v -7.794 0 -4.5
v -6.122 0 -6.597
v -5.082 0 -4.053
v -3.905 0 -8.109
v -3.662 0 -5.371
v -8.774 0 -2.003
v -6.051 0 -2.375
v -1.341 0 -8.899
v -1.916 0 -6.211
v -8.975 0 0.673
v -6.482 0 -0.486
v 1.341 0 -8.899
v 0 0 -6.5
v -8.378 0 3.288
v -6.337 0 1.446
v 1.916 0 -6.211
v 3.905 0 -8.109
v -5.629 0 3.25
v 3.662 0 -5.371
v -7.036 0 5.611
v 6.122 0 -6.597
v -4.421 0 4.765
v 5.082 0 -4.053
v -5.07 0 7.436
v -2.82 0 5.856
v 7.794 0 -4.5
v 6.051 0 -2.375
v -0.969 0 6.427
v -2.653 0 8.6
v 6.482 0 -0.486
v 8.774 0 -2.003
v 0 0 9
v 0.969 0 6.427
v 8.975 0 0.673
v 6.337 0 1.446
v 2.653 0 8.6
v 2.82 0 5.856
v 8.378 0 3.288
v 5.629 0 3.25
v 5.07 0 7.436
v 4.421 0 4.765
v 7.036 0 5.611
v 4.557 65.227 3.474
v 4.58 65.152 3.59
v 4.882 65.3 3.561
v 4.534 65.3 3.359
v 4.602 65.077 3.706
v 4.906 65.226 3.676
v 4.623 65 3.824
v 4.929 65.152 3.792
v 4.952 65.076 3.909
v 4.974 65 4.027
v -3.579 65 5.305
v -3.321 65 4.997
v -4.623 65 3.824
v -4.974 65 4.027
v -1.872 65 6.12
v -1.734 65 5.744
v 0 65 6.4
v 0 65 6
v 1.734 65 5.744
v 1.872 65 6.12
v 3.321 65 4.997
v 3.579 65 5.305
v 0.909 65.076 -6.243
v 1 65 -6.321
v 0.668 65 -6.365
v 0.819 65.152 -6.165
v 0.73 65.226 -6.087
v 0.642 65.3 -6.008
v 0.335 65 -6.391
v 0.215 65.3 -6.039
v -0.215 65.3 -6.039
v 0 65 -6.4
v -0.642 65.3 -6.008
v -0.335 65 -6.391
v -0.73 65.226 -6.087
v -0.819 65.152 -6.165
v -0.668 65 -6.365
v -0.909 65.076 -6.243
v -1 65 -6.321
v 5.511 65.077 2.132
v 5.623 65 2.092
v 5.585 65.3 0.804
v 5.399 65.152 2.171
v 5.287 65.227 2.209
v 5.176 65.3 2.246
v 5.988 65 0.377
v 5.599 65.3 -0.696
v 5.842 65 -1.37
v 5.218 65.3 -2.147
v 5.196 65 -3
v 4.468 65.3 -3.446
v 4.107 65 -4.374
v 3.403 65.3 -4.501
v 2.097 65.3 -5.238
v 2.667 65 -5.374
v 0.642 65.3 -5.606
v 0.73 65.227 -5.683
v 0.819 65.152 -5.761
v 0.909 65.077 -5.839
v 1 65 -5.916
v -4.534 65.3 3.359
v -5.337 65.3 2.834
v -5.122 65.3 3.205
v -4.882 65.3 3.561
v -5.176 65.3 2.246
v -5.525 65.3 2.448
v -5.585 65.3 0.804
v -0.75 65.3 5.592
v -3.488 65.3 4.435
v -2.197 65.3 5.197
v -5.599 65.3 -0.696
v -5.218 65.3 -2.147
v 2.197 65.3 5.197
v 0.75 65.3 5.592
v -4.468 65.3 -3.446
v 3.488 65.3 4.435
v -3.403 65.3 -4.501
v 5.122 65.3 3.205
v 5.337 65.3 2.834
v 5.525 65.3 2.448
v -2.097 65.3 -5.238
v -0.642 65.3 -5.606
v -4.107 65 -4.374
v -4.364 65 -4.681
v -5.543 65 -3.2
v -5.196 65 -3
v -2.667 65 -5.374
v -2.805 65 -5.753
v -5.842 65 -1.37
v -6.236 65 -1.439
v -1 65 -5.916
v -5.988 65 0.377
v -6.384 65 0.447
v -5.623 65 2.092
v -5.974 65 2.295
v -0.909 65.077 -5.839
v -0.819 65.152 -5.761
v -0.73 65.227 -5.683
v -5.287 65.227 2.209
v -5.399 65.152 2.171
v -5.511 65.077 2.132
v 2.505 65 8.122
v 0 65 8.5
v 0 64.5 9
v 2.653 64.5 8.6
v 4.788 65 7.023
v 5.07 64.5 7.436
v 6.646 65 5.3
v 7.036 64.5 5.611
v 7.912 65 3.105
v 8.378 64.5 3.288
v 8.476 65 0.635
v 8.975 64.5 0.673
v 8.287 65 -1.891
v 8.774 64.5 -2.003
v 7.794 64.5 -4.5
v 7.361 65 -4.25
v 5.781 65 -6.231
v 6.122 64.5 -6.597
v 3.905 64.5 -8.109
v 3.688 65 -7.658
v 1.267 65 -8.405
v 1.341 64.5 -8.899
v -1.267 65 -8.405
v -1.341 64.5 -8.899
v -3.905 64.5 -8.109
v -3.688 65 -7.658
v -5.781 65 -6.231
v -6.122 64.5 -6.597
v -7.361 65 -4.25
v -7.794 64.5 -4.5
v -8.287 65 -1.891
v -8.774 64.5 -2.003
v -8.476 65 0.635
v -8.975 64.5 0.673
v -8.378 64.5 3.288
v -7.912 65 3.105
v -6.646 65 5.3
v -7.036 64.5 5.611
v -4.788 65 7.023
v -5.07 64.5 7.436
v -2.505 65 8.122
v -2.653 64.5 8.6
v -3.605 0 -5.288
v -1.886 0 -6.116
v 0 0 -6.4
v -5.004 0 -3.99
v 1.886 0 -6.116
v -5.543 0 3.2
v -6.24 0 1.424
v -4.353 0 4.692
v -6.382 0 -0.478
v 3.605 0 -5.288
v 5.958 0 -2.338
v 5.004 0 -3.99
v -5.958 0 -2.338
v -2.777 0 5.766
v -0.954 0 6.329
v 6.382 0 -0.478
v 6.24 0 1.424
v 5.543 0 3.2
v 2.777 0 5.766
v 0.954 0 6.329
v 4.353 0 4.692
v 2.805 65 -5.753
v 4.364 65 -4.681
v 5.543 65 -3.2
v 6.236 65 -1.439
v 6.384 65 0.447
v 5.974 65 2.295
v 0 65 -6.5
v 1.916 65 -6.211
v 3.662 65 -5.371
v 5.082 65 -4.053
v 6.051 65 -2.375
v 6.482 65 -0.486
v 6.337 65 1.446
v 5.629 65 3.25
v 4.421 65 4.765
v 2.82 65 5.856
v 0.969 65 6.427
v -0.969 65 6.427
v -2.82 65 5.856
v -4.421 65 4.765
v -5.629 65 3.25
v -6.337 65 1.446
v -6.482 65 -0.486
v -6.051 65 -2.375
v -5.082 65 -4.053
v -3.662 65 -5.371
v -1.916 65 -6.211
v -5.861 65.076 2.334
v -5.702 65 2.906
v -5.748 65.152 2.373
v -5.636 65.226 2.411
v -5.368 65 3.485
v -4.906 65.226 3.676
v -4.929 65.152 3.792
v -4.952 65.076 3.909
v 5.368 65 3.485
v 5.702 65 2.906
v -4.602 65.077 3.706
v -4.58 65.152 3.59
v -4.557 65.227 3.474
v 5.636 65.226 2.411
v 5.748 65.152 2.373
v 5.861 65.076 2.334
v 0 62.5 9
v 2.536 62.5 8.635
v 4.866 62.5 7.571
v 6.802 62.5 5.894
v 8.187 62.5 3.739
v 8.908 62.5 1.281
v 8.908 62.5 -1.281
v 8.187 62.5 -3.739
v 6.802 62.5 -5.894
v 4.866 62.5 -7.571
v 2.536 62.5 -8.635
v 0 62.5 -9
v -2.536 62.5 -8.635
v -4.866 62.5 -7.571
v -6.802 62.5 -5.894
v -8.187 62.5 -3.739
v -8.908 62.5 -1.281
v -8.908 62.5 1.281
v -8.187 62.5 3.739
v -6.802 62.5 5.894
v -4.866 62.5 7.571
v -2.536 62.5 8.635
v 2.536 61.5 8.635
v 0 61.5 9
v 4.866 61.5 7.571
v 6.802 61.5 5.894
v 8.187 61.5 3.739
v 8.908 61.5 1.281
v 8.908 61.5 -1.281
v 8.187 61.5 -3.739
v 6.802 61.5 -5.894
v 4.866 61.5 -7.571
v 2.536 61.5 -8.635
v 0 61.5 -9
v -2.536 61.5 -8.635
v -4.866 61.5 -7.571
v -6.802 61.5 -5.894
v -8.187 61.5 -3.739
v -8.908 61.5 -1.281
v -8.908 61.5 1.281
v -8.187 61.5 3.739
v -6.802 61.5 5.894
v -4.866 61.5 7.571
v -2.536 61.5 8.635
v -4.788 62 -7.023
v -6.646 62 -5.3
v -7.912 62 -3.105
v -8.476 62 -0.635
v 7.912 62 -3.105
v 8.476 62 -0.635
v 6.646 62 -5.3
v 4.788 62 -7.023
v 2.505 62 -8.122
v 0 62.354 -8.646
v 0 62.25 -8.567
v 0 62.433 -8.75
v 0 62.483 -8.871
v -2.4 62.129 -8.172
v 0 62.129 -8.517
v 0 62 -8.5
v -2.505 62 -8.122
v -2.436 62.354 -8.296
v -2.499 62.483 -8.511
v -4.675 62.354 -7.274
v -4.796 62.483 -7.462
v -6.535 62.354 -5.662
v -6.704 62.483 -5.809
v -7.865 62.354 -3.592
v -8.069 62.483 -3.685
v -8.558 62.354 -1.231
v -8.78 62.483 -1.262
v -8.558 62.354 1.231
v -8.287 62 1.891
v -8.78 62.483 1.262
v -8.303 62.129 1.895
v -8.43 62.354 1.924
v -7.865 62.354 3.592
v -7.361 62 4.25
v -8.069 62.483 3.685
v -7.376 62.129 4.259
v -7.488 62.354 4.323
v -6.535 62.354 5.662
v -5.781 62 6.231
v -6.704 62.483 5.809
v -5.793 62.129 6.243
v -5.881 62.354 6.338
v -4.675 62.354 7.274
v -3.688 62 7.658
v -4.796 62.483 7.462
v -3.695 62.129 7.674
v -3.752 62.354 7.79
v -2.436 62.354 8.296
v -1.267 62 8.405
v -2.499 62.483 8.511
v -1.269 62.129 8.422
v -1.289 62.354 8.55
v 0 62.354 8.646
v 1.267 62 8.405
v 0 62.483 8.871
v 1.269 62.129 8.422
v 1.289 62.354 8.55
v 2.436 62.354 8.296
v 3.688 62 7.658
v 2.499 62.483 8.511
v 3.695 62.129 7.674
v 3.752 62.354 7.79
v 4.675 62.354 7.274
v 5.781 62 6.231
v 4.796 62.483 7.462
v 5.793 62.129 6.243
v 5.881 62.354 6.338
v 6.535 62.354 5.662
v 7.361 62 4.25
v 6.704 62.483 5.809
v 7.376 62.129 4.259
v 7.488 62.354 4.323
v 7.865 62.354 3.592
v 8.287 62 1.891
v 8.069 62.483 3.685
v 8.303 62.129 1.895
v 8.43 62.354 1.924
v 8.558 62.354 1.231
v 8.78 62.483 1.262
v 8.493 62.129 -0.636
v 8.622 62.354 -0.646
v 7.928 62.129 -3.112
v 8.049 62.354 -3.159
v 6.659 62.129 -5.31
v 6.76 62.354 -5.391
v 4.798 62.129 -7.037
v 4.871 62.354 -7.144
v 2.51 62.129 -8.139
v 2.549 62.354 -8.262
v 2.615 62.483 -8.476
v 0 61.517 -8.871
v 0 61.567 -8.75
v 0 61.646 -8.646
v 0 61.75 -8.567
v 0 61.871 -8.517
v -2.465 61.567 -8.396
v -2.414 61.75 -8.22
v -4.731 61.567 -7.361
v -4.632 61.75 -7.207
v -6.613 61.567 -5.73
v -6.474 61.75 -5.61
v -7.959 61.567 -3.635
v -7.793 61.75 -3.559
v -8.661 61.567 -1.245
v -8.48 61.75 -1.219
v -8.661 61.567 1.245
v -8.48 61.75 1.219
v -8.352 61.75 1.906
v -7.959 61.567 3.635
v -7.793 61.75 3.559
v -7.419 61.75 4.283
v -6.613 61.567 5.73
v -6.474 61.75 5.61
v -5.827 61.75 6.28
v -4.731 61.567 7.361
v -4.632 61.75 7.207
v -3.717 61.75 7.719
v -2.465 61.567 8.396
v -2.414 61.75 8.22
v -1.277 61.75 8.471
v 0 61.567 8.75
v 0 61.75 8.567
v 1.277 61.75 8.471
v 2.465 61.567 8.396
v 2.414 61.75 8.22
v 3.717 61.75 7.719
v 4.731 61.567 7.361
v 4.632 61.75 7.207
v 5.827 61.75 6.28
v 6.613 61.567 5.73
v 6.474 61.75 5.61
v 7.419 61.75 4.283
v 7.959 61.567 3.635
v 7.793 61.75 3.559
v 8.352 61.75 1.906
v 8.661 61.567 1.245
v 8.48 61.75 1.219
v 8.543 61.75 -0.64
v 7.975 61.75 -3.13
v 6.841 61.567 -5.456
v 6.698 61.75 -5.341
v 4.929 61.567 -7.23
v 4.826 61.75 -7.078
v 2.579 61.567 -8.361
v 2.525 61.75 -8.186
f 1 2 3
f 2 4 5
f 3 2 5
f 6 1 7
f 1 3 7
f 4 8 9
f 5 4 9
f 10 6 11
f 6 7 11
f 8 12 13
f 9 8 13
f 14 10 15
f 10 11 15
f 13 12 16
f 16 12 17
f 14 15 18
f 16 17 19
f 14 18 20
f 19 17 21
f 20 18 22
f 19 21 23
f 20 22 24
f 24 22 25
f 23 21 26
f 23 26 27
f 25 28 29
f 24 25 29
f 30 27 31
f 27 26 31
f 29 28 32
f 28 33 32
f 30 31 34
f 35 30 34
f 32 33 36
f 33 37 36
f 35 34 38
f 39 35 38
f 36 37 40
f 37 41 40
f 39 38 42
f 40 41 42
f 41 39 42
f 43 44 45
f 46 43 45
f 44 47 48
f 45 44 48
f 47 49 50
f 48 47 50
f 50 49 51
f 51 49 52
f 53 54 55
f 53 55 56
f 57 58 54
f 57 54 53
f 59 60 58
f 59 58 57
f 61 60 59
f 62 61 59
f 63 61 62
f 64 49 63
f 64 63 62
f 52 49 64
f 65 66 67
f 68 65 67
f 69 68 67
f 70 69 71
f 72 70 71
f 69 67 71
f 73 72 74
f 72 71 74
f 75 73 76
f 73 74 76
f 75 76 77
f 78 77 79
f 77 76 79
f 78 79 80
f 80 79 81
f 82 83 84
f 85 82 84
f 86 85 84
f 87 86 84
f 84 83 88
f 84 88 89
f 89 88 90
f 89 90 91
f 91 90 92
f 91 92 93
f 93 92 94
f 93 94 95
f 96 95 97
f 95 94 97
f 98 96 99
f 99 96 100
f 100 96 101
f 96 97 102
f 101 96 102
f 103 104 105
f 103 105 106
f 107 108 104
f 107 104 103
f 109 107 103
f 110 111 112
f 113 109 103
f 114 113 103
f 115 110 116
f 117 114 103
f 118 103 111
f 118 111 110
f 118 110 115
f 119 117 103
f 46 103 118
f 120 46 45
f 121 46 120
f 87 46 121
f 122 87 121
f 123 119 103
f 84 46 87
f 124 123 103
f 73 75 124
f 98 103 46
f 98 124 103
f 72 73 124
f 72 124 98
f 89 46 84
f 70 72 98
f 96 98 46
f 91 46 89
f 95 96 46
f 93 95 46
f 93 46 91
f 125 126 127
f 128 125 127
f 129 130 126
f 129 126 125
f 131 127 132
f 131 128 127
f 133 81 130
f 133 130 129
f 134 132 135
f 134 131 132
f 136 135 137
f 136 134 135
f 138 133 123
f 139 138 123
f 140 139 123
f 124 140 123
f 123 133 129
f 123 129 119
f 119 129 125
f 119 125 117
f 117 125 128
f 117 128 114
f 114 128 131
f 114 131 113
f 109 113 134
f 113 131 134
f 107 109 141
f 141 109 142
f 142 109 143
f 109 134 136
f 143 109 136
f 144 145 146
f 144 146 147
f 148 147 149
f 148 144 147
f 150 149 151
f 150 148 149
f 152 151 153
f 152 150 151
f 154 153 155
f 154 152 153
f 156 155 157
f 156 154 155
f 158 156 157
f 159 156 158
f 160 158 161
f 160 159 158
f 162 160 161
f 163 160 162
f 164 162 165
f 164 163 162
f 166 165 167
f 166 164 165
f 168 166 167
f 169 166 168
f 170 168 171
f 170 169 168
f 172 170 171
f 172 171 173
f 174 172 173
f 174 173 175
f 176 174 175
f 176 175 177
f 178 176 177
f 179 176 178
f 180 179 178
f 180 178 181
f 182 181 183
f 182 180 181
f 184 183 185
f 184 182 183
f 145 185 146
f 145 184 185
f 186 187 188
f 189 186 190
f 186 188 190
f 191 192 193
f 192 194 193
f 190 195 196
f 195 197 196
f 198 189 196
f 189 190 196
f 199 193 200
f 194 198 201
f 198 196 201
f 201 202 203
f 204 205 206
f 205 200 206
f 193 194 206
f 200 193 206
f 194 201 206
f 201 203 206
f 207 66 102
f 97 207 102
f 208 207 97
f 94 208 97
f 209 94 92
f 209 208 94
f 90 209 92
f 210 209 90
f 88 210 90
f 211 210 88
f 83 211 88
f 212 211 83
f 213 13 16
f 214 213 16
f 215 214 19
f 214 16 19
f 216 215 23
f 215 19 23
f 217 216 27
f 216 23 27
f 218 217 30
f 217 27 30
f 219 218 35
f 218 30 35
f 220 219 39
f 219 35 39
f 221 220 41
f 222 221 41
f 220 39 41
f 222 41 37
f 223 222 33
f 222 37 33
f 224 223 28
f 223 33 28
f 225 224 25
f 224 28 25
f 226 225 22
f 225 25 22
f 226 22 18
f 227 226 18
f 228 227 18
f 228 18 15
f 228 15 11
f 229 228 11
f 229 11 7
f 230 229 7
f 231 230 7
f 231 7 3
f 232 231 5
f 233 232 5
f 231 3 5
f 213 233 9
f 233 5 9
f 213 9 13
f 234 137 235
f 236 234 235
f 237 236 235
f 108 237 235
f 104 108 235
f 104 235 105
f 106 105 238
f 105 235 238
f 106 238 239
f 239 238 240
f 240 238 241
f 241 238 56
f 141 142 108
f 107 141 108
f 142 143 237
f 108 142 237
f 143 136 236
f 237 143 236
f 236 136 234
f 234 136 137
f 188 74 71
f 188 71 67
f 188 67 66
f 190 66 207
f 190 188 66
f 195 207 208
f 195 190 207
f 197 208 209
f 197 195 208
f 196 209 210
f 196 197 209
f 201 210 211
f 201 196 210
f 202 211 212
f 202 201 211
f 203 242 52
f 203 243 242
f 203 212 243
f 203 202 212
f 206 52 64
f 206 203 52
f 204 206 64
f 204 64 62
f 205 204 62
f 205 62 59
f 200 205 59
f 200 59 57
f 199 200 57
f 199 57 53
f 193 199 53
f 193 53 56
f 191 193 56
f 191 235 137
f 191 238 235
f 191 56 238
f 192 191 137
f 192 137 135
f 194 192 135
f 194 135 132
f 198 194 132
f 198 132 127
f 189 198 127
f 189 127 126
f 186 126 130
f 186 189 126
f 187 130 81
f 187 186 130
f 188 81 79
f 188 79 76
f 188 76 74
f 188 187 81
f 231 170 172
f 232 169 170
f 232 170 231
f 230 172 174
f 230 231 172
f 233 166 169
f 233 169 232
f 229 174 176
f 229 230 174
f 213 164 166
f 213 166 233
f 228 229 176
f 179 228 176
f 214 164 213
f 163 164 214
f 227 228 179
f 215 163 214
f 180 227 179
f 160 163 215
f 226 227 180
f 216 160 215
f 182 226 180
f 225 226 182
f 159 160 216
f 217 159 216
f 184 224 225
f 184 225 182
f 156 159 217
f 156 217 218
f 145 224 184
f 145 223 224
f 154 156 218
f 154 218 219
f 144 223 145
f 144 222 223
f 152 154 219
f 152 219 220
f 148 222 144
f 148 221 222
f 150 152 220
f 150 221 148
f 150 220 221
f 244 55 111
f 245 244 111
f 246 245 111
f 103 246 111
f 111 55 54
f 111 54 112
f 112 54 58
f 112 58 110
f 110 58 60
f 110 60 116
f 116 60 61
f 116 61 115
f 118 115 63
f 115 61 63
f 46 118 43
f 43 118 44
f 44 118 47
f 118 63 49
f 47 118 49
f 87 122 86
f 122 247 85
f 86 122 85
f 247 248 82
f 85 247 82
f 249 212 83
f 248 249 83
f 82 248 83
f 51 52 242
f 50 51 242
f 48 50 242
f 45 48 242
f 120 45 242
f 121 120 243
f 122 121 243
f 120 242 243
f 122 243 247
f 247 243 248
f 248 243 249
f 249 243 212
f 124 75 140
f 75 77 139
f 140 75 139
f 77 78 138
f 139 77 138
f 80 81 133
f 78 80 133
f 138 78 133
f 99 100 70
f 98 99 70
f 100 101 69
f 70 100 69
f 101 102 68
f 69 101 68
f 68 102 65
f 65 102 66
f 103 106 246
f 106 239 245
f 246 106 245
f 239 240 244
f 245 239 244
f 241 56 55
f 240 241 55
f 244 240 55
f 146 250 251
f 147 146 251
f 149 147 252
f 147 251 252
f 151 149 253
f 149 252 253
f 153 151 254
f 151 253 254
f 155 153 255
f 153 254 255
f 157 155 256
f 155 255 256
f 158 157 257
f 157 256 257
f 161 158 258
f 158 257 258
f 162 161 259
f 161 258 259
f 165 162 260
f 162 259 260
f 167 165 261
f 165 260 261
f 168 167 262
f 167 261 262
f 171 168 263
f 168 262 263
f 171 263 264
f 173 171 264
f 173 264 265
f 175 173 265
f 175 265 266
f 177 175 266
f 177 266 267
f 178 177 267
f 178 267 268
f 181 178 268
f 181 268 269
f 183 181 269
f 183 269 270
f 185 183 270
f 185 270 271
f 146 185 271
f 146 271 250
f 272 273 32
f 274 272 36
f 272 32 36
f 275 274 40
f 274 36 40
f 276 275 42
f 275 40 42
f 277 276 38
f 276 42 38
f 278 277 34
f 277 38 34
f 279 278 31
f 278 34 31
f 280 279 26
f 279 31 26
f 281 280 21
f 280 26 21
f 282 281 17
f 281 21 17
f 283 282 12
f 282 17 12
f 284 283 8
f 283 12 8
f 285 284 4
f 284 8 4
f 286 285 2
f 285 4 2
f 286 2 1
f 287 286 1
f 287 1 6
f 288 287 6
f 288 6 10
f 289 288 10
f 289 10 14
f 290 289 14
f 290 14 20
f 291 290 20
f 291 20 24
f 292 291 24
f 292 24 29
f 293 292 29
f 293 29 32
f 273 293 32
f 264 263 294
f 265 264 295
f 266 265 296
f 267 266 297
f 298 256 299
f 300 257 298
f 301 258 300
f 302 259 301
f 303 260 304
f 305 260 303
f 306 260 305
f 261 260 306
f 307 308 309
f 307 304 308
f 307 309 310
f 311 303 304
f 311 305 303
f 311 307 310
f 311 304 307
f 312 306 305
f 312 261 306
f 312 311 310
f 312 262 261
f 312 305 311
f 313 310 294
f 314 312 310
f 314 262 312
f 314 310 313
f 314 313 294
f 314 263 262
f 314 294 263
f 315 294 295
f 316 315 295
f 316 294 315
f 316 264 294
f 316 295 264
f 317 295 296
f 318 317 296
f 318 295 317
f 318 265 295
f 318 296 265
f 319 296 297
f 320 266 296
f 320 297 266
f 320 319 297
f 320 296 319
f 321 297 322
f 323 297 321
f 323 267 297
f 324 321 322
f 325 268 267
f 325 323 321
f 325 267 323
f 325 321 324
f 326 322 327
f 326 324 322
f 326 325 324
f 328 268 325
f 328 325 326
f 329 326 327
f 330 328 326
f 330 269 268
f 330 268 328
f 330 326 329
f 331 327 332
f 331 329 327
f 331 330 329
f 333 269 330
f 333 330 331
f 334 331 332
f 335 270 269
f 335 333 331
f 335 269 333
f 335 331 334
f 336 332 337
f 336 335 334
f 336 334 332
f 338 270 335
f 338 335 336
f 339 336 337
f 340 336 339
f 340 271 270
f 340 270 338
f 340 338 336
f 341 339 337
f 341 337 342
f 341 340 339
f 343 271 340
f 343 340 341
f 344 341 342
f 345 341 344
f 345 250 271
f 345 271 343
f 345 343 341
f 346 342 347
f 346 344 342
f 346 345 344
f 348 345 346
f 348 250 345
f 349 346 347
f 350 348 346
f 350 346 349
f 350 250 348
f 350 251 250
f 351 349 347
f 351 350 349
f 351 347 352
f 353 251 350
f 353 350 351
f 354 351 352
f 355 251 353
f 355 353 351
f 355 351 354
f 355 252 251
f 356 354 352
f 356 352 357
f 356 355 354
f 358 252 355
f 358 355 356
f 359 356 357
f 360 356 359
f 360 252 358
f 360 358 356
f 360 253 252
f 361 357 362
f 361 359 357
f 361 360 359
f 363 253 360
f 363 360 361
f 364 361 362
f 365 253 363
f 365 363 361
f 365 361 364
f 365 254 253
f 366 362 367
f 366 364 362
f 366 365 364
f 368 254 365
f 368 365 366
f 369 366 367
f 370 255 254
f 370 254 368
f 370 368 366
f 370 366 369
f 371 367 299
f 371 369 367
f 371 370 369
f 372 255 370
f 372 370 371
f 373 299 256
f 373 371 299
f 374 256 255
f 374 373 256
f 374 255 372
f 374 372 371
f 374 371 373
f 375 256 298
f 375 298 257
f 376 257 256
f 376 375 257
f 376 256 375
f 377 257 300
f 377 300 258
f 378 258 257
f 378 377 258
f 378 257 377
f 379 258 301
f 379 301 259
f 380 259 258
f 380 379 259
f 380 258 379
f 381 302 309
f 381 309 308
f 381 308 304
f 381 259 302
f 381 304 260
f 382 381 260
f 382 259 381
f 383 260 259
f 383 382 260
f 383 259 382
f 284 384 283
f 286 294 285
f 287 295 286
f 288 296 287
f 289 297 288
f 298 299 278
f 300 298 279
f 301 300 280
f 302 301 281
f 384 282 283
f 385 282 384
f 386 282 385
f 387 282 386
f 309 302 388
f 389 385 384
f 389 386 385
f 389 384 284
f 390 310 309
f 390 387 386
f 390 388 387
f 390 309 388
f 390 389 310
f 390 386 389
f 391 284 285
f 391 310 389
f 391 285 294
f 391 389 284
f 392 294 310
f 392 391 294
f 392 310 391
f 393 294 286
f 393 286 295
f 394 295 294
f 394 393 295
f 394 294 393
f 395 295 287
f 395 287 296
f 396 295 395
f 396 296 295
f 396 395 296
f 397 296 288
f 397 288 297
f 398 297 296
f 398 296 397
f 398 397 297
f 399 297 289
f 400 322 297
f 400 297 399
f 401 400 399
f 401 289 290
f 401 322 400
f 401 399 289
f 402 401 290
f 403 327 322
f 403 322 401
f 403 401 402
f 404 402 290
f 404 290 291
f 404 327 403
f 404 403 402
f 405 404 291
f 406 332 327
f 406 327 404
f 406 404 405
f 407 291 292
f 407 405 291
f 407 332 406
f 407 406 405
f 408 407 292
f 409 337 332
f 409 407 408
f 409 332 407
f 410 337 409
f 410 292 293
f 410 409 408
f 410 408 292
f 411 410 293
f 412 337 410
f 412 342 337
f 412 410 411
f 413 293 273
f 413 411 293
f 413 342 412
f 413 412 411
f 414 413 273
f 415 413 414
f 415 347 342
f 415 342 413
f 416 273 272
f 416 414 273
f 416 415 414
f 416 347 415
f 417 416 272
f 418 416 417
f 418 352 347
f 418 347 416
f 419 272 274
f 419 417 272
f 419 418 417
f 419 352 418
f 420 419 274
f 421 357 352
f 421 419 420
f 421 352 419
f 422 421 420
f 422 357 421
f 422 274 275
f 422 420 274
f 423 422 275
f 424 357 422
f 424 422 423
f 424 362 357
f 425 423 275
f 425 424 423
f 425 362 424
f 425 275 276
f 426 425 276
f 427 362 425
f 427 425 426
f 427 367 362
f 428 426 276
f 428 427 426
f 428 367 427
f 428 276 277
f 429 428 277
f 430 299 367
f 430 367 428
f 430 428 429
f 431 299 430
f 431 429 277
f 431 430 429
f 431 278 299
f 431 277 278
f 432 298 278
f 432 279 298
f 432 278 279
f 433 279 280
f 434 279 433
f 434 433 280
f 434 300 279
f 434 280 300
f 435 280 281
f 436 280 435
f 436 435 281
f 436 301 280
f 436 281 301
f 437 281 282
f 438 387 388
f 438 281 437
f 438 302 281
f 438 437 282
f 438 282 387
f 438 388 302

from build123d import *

# Parameters (mm, degrees)
SKETCH_1_R          = 9
EXTRUDE_1_DEPTH     = 65
SKETCH_2_R          = 0.5
CHAMFER_1_SIZE      = 0.5
SKETCH_3_R          = 6.5
SKETCH_3_R_2        = 6.4
CUT_EXTRUDE_1_DEPTH = 65
EXTRUDE_2_DEPTH     = 0.3
EXTRUDE_2_DRAFT     = 50


with BuildPart() as part:
    # Эскиз1 → Бобышка-Вытянуть1 (new body)
    with BuildSketch(Plane(origin=(0, 0, 0), x_dir=(1, 0, 0), z_dir=(0, 1, 0))):
        with Locations(Location((0, 0, 0), (0, 0, 270))):
            Circle(SKETCH_1_R)
    extrude(amount=EXTRUDE_1_DEPTH)

    # Эскиз2 → Вырез-Повернуть1 (revolve, cut)
    with BuildSketch(Plane.XY, mode=Mode.PRIVATE) as cut_revolve_1_sk:
        with Locations((-9, 62)):
            Circle(SKETCH_2_R)
    revolve(cut_revolve_1_sk.sketch.rotate(Axis((0, 0, 0), (0, 1, 0)), 270), axis=Axis((0, 0, 0), (0, 1, 0)), mode=Mode.SUBTRACT)

    # Фаска1
    chamfer_1_edges = [part.edges().sort_by_distance(p)[0] for p in [
        (0, 65, -9),
    ]]
    chamfer(chamfer_1_edges, length=CHAMFER_1_SIZE)

    # Эскиз3 → Вырез-Вытянуть1 (cut)
    with BuildSketch(Plane.XZ):
        with Locations(Location((0, 0, 0), (0, 0, 270))):
            Circle(SKETCH_3_R)
        with Locations(Location((0, 0, 0), (0, 0, 270))):
            Circle(SKETCH_3_R_2, mode=Mode.SUBTRACT)
    extrude(amount=-CUT_EXTRUDE_1_DEPTH, mode=Mode.SUBTRACT)


with BuildPart() as cut_extrude_1_piece_1:
    # of the separate pieces the step leaves, piece 1, a body of its own (cut_extrude_1_pieces)
    add(part.part.solids().sort_by_distance((0, 65, -6.4))[0])


with BuildPart() as cut_extrude_1_piece_2:
    # of the separate pieces the step leaves, piece 2, a body of its own (cut_extrude_1_pieces)
    add(part.part.solids().sort_by_distance((0, 64.5, 9))[0])


with BuildPart() as extrude_2_tool:
    # Эскиз4 → Бобышка-Вытянуть2 (with draft: the straight prism first)
    with BuildSketch(Plane(origin=(0, 65, 0), x_dir=(1, 0, 0), z_dir=(0, 1, 0))):
        with BuildLine():
            ThreePointArc((-1, 5.916079783), (-5.196152423, 3), (-5.623475383, -2.092014488))
            Line((-5.623475383, -2.092014488), (-5.974486277, -2.294670722))
            ThreePointArc((-5.974486277, -2.294670722), (-5.542562584, -3.2), (-4.974486277, -4.02672153))
            Line((-4.974486277, -4.02672153), (-4.623475383, -3.824065295))
            ThreePointArc((-4.623475383, -3.824065295), (0, -6), (4.623475383, -3.824065295))
            Line((4.623475383, -3.824065295), (4.974486277, -4.02672153))
            ThreePointArc((4.974486277, -4.02672153), (5.542562584, -3.2), (5.974486277, -2.294670722))
            Line((5.974486277, -2.294670722), (5.623475383, -2.092014488))
            ThreePointArc((5.623475383, -2.092014488), (5.196152423, 3), (1, 5.916079783))
            Line((1, 5.916079783), (1, 6.321392252))
            ThreePointArc((1, 6.321392252), (0, 6.4), (-1, 6.321392252))
            Line((-1, 6.321392252), (-1, 5.916079783))
        make_face()
    extrude(amount=EXTRUDE_2_DEPTH)
    # Бобышка-Вытянуть2: the draft: its side faces are tilted about the plane it starts from
    extrude_2_sides = [extrude_2_tool.faces().sort_by_distance(p)[0] for p in [
        (-5.196152423, 65.15, -3),
        (-5.79898083, 65.15, 2.193342605),
        (-5.542562584, 65.15, 3.2),
        (-4.79898083, 65.15, 3.925393412),
        (0, 65.15, 6),
        (4.79898083, 65.15, 3.925393412),
        (5.542562584, 65.15, 3.2),
        (5.79898083, 65.15, 2.193342605),
        (5.196152423, 65.15, -3),
        (1, 65.15, -6.118736017),
        (0, 65.15, -6.4),
        (-1, 65.15, -6.118736017),
    ]]
    draft(extrude_2_sides, Plane(origin=(0, 65, 0), x_dir=(1, 0, 0), z_dir=(0, 1, 0)), EXTRUDE_2_DRAFT)


with BuildPart() as cut_extrude_1_piece_1_1:
    add(cut_extrude_1_piece_1.part)

    # Бобышка-Вытянуть2: add extrude_2_tool
    add(extrude_2_tool.part)


solid = Compound([cut_extrude_1_piece_2.part, cut_extrude_1_piece_1_1.part])
